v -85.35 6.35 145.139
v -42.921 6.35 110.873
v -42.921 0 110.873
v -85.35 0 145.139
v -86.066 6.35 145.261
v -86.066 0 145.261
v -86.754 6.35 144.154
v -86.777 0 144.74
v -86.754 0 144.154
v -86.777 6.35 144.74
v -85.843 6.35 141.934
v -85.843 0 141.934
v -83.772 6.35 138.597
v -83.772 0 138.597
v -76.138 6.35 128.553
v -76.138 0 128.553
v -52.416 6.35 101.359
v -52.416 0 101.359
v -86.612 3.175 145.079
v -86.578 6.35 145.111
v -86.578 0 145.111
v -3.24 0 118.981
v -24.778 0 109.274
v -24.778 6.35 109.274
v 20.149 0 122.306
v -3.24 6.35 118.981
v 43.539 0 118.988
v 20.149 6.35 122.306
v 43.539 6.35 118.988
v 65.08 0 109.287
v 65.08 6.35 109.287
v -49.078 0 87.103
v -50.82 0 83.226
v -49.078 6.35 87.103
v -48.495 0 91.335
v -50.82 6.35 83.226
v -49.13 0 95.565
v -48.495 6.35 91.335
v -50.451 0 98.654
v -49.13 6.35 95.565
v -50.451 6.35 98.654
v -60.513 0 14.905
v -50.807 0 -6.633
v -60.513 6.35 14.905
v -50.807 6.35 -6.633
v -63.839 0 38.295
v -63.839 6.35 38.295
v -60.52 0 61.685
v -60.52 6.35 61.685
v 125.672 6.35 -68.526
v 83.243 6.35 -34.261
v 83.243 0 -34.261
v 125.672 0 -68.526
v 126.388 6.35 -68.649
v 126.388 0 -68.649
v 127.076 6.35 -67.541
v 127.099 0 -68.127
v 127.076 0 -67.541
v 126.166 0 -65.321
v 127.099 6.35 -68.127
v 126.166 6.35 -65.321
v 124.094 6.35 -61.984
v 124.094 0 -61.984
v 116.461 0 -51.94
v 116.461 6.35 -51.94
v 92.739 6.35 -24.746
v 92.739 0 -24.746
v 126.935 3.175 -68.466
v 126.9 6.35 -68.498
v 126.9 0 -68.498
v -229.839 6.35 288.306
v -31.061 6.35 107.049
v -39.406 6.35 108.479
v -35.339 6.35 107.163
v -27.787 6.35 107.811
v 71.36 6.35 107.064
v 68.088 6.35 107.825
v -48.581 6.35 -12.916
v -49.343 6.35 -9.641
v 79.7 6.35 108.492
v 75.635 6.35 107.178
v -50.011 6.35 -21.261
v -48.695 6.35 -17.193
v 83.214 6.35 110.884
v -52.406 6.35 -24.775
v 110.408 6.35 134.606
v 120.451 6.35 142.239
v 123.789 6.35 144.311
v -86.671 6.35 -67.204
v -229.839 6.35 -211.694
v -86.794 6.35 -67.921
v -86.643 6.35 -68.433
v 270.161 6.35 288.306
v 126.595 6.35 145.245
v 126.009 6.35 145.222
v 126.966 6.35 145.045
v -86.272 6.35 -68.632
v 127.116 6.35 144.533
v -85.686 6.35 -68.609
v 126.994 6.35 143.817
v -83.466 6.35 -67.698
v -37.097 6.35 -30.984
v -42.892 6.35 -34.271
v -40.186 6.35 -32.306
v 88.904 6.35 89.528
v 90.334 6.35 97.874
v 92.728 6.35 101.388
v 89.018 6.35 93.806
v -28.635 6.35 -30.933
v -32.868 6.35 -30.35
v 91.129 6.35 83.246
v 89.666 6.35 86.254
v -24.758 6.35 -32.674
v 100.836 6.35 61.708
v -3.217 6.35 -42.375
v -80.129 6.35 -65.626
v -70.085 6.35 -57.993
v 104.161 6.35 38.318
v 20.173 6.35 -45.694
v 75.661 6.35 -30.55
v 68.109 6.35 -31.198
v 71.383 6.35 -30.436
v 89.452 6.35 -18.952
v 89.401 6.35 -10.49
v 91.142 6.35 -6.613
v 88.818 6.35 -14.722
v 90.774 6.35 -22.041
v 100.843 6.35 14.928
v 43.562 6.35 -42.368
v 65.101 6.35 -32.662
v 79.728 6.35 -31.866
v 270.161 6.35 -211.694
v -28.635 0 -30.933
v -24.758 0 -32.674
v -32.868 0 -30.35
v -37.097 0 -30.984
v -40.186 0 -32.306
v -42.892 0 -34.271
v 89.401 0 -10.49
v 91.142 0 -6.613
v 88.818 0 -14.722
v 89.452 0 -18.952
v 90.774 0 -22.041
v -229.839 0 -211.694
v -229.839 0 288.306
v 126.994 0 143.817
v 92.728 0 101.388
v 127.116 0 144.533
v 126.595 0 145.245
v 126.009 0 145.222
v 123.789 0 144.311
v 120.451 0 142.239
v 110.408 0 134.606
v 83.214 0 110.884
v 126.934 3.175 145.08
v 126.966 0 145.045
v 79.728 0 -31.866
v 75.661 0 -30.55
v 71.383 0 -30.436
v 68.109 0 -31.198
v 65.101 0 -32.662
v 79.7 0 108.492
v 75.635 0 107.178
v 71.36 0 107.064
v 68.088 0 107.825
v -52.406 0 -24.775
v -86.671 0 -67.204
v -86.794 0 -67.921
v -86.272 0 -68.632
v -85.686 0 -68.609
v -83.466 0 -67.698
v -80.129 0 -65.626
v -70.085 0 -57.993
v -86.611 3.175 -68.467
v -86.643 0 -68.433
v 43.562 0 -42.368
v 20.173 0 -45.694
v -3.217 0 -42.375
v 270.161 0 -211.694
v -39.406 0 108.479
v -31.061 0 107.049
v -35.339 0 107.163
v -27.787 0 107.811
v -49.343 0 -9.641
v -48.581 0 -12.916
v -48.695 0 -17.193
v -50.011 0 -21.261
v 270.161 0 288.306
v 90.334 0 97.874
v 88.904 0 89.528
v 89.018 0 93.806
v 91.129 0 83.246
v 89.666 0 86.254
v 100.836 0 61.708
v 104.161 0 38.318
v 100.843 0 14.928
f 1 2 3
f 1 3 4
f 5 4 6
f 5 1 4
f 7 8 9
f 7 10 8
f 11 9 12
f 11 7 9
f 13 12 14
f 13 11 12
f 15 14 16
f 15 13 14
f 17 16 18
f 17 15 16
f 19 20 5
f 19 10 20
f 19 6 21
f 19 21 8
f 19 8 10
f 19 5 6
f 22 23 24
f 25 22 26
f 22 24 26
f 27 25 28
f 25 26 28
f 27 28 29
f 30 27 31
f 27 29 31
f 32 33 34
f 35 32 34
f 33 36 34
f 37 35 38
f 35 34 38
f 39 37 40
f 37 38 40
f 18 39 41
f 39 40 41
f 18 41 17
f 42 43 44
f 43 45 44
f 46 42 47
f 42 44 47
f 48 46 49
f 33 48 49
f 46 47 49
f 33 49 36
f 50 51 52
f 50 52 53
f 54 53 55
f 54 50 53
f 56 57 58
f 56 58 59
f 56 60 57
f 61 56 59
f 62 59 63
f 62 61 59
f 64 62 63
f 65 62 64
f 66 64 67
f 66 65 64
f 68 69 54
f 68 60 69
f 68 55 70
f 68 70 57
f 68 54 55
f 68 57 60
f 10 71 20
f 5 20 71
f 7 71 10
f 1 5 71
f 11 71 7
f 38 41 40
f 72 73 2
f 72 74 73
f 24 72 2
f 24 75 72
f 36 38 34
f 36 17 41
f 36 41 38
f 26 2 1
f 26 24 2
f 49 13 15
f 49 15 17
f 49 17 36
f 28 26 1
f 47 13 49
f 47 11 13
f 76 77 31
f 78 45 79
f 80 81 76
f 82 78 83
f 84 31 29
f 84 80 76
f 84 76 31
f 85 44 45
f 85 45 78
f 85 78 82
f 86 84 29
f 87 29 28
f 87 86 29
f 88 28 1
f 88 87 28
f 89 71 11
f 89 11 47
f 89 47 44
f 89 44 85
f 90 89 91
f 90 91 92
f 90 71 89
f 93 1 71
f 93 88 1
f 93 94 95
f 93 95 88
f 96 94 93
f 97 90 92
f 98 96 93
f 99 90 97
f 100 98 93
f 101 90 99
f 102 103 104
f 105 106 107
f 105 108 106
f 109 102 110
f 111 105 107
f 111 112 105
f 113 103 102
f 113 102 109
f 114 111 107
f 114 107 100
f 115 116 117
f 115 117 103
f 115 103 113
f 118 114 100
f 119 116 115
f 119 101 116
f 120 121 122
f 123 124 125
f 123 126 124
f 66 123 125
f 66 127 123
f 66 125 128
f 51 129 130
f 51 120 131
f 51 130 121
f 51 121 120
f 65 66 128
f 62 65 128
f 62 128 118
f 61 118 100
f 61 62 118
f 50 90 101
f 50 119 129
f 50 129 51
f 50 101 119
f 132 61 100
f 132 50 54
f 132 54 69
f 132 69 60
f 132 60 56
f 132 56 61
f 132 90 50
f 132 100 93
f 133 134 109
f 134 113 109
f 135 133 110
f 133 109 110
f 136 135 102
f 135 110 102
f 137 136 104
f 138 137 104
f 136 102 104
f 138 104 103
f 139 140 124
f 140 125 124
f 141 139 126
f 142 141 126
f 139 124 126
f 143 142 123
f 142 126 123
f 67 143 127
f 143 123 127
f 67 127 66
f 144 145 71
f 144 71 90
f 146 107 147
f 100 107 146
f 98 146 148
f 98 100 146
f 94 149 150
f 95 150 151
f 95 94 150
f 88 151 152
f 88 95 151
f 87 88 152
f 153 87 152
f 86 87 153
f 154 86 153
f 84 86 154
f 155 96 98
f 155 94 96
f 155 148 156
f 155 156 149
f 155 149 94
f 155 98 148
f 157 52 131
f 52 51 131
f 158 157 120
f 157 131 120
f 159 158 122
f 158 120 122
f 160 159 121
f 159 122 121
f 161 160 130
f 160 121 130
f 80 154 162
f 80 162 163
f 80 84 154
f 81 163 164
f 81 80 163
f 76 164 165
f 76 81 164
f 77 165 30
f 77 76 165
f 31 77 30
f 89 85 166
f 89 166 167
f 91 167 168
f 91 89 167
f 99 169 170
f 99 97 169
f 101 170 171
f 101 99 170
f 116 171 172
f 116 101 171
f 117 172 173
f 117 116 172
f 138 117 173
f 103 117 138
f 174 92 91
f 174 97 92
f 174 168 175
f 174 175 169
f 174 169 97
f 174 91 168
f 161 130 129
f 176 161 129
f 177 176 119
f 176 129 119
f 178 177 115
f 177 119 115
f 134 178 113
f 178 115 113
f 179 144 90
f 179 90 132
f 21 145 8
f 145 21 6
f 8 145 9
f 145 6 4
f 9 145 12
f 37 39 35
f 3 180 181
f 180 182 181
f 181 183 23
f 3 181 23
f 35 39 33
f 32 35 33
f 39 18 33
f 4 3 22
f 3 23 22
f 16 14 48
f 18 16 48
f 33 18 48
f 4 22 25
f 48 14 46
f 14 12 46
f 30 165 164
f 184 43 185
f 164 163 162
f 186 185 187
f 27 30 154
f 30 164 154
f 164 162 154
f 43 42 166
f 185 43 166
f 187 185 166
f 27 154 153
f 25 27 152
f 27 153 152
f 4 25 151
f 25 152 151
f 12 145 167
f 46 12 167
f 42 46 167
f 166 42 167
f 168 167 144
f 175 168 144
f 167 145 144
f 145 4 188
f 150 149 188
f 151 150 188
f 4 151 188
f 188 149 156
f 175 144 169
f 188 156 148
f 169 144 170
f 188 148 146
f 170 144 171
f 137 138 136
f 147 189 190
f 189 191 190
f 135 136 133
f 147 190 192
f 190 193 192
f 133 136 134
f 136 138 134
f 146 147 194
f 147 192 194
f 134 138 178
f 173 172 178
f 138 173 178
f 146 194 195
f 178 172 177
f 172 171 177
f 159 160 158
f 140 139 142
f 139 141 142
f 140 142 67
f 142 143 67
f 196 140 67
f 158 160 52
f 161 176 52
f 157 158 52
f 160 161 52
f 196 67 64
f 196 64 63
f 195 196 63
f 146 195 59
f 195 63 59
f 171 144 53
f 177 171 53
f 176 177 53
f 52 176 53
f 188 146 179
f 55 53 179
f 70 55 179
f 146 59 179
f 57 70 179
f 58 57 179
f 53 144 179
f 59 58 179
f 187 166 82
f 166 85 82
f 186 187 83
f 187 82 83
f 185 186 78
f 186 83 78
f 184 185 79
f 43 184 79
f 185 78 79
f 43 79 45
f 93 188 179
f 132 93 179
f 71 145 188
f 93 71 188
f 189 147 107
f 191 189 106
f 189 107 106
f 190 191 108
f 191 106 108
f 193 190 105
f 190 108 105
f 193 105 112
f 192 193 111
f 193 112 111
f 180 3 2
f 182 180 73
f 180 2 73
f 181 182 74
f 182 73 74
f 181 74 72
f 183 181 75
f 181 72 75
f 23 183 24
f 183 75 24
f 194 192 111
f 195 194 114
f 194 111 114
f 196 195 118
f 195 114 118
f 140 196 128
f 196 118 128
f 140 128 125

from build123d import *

# Parameters (mm, degrees)
SKETCH1_W           = 500
SKETCH1_H           = 500
BOSS_EXTRUDE1_DEPTH = 6.35
SKETCH2_R           = 84
CUT_EXTRUDE1_DEPTH  = 6.35
CUT_EXTRUDE2_DEPTH  = 6.35
FILLET1_R           = 15


with BuildPart() as part:
    # Sketch1 → Boss-Extrude1 (new body)
    with BuildSketch(Plane(origin=(0, 0, 0), x_dir=(1, 0, 0), z_dir=(0, 1, 0))):
        with Locations((20.161290323, -38.306451613)):
            Rectangle(SKETCH1_W, SKETCH1_H)
    extrude(amount=BOSS_EXTRUDE1_DEPTH)

    # Sketch2 → Cut-Extrude1 (cut)
    with BuildSketch(Plane(origin=(0, 6.35, 0), x_dir=(1, 0, 0), z_dir=(0, 1, 0))):
        with Locations(Location((20.161290323, -38.306451613, 0), (0, 0, 270))):
            Circle(SKETCH2_R)
    extrude(amount=-CUT_EXTRUDE1_DEPTH, mode=Mode.SUBTRACT)

    # Sketch3 → Cut-Extrude2 (cut)
    with BuildSketch(Plane(origin=(0, 6.35, 0), x_dir=(1, 0, 0), z_dir=(0, 1, 0))):
        with BuildLine():
            Line((-38.161167808, 9.435852288), (-27.555823691, 20.043711457))
            add(Edge.make_bspline(
                [(-38.161167808, 9.435852288), (-209.678686167, 191.47297422), (-27.555823691, 20.043711457)],
                knots=[0, 0, 0, 1, 1, 1], degree=2, weights=[1, 0.436781609, 1]))
        make_face()
        with BuildLine():
            Line((-27.581013578, -96.628911245), (-38.188872748, -86.023567127))
            add(Edge.make_bspline(
                [(-27.581013578, -96.628911245), (-209.61813551, -268.146429603), (-38.188872748, -86.023567127)],
                knots=[0, 0, 0, 1, 1, 1], degree=2, weights=[1, 0.436781609, 1]))
        make_face()
        with BuildLine():
            Line((78.483749955, -86.048757015), (67.878405837, -96.656616184))
            add(Edge.make_bspline(
                [(78.483749955, -86.048757015), (250.001268313, -268.085878946), (67.878405837, -96.656616184)],
                knots=[0, 0, 0, 1, 1, 1], degree=2, weights=[1, 0.436781609, 1]))
        make_face()
        with BuildLine():
            Line((67.903595725, 20.016006518), (78.511454894, 9.410662401))
            add(Edge.make_bspline(
                [(67.903595725, 20.016006518), (249.940717656, 191.533524877), (78.511454894, 9.410662401)],
                knots=[0, 0, 0, 1, 1, 1], degree=2, weights=[1, 0.436781609, 1]))
        make_face()
    extrude(amount=-CUT_EXTRUDE2_DEPTH, mode=Mode.SUBTRACT)

    # Fillet1
    fillet1_edges = [part.edges().sort_by_distance(p)[0] for p in [
        (-33.927432607, 3.175, 102.574717902),
        (-44.128484725, 3.175, 92.369607499),
        (84.429555949, 3.175, 92.395175331),
        (74.224445361, 3.175, 102.596227373),
        (-44.106975254, 3.175, -15.782272163),
        (-33.901864775, 3.175, -25.983324098),
        (74.250014887, 3.175, -25.961813301),
        (84.451066746, 3.175, -15.756702637),
    ]]
    fillet(fillet1_edges, radius=FILLET1_R)


solid = part.part
